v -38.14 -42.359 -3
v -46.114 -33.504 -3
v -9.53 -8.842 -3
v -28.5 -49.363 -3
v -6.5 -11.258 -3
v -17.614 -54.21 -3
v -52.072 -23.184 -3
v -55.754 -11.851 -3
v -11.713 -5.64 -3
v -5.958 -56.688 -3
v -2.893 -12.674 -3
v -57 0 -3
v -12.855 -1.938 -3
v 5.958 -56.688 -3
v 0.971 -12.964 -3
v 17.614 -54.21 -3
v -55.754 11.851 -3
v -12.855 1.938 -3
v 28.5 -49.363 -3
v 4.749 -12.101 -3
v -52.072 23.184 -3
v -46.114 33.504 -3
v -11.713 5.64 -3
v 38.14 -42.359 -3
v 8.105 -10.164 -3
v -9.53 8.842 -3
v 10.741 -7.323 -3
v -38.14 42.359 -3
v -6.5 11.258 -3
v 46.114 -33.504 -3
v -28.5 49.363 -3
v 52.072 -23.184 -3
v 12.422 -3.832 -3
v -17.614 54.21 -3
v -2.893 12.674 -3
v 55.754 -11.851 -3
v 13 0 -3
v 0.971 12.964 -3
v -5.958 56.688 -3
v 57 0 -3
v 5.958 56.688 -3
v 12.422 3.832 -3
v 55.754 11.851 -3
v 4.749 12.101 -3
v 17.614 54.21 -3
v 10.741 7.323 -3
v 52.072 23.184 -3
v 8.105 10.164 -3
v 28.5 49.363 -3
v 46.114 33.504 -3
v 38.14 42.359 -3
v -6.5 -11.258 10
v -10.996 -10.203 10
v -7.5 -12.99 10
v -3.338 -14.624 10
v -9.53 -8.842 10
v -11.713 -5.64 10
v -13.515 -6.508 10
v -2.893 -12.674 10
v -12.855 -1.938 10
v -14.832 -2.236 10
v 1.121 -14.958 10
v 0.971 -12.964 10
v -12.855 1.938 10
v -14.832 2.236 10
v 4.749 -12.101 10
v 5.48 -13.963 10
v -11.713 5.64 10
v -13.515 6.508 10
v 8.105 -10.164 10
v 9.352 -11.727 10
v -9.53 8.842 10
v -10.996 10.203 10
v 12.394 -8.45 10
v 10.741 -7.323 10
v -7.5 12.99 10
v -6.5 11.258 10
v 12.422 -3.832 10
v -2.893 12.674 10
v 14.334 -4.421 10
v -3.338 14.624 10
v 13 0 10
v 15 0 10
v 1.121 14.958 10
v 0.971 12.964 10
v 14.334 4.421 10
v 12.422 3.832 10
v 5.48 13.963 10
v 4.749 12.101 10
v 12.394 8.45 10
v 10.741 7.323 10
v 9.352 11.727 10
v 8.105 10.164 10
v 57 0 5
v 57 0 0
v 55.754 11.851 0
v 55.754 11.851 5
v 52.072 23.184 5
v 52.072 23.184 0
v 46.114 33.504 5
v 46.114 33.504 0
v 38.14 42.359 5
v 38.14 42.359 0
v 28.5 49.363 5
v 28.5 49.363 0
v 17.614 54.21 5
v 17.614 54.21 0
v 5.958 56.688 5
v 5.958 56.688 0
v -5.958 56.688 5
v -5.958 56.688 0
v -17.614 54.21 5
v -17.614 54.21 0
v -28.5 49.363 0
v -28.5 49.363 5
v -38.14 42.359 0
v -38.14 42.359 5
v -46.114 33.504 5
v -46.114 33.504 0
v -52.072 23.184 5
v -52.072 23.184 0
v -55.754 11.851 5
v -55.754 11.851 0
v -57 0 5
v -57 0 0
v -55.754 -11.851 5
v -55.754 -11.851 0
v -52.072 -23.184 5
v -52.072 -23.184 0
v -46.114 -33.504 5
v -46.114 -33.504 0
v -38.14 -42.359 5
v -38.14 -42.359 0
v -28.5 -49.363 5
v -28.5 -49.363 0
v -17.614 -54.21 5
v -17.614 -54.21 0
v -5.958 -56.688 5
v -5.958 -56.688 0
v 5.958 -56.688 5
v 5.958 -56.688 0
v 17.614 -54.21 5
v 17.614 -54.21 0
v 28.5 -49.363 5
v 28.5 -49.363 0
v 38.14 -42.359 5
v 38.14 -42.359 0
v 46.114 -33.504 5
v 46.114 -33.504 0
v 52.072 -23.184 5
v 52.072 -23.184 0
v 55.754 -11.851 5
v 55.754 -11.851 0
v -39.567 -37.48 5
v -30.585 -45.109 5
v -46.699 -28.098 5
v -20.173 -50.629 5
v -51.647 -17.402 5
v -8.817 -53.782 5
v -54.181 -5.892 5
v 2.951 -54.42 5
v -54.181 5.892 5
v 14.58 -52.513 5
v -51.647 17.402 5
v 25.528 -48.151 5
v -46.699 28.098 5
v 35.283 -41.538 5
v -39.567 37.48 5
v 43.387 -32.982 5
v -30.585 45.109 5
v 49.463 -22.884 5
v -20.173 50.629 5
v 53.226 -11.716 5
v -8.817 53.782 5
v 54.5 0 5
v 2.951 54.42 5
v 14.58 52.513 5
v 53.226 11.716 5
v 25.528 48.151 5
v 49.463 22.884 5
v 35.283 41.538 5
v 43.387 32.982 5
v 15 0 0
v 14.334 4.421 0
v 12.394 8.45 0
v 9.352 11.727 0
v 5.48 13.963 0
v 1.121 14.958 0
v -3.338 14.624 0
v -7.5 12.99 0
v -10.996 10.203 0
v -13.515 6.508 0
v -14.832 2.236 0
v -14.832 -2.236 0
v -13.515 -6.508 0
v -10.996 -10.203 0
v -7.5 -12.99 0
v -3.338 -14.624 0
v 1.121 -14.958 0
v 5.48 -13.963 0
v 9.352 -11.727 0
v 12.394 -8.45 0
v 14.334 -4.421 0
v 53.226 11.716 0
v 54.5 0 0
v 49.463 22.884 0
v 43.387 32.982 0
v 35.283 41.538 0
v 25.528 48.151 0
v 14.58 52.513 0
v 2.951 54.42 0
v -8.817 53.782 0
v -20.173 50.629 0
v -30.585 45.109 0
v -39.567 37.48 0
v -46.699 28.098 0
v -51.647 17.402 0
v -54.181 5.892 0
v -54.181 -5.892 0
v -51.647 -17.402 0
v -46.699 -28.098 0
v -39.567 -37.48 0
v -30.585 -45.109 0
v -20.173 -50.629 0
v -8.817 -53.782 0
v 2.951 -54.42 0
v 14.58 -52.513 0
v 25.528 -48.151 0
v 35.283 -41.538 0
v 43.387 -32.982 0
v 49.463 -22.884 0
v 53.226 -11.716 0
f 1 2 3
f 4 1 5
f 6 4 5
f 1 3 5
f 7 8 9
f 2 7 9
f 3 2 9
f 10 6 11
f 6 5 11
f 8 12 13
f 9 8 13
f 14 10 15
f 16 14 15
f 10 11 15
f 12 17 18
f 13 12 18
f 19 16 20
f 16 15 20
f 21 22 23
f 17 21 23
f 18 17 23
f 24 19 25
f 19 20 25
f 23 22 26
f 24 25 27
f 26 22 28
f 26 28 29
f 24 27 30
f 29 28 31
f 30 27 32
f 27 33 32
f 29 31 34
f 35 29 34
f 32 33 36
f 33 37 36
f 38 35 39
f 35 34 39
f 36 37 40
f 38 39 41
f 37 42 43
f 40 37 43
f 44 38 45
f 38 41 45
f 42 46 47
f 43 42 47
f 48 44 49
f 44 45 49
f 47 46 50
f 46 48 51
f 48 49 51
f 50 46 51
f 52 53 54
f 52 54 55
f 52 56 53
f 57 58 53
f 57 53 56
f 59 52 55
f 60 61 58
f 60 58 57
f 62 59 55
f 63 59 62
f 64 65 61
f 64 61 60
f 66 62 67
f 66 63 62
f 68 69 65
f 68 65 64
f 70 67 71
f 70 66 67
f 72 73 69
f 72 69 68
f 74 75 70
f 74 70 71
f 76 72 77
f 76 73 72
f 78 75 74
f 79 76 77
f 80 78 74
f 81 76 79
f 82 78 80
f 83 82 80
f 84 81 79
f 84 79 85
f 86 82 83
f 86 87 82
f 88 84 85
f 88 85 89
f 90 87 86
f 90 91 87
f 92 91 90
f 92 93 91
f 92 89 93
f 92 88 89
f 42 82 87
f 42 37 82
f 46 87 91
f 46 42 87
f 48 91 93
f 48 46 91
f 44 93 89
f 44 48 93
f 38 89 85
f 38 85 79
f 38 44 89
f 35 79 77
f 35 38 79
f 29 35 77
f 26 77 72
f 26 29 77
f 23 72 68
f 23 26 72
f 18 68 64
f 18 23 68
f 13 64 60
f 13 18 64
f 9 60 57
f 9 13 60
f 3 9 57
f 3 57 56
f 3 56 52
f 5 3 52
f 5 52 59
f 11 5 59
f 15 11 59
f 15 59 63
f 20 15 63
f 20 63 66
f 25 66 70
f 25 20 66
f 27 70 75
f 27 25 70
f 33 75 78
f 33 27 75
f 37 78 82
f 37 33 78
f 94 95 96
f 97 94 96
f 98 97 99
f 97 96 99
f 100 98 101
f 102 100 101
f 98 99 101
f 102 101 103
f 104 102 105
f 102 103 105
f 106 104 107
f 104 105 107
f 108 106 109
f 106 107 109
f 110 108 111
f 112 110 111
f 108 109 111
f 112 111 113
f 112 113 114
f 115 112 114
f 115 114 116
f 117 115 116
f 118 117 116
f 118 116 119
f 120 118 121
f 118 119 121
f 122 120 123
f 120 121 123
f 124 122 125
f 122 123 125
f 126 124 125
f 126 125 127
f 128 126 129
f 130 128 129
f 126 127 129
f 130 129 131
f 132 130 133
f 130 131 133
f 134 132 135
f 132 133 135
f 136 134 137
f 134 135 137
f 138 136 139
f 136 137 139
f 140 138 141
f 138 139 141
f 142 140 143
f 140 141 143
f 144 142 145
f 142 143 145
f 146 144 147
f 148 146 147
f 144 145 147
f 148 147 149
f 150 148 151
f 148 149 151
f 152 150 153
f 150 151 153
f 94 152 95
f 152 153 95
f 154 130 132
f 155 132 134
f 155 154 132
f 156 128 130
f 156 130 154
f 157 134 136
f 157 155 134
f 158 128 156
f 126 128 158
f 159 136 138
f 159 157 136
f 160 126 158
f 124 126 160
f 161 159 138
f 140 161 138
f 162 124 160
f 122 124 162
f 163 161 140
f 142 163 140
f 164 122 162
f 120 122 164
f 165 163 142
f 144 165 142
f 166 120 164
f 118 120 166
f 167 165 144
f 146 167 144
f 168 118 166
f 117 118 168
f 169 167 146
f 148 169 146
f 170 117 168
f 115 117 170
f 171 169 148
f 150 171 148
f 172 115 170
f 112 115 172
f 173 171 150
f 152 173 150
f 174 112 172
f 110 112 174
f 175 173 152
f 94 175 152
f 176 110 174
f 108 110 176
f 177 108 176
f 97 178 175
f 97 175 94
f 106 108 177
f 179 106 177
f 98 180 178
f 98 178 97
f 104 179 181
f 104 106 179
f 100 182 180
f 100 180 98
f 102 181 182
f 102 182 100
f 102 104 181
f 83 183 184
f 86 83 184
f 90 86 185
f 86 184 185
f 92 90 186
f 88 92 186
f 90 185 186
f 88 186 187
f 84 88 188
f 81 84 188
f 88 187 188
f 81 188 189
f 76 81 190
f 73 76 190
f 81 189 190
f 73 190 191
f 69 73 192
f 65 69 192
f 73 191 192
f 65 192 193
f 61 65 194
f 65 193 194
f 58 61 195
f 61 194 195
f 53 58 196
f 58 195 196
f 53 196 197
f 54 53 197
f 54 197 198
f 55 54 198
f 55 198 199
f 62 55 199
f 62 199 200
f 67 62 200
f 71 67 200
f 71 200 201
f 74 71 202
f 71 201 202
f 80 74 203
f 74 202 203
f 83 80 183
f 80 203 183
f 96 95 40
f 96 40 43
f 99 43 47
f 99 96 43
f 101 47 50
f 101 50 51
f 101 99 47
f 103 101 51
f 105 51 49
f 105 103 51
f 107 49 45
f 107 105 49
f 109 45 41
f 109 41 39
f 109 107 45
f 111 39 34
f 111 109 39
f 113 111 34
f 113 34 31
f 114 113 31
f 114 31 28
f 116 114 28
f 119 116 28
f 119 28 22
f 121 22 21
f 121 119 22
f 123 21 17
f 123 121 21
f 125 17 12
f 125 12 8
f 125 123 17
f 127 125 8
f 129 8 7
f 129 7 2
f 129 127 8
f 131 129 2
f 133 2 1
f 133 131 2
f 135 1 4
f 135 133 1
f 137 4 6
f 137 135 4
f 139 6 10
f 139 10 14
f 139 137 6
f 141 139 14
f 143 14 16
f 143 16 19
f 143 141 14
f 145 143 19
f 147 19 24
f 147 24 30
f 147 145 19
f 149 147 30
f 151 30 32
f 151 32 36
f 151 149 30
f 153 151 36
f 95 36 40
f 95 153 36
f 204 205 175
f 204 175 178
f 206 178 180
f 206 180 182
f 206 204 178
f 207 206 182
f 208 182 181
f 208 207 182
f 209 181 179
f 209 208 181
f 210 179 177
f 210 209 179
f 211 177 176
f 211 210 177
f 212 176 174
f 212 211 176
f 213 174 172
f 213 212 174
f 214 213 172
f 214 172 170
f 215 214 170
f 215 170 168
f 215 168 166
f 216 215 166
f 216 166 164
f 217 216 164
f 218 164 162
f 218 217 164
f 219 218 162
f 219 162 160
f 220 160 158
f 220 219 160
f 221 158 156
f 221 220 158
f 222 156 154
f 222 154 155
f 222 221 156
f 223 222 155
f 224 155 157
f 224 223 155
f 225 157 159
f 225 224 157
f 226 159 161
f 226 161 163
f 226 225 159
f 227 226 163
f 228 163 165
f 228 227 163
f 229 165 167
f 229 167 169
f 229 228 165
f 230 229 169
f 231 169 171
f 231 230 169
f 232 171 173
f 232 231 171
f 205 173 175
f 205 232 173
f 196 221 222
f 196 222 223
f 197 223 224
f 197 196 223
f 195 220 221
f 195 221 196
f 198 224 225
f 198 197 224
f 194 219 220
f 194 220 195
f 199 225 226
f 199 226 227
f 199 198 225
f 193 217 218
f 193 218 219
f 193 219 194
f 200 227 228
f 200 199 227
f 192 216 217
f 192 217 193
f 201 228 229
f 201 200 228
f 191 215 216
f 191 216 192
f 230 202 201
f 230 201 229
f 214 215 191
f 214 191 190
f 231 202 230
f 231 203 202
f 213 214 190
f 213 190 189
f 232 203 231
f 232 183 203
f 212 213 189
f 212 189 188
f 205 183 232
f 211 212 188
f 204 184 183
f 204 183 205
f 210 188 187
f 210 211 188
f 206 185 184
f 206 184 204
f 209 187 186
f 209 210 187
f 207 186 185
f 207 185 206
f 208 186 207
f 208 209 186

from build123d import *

# Parameters (mm, degrees)
F0_R     = 57
F0_R_2   = 54.5
F0_R_3   = 15
F0_R_4   = 13
F1_DEPTH = 3
F2_DEPTH = 5
F3_DEPTH = 10


with BuildPart() as f1:
    # F0 (on Top) → F1 (new body)
    with BuildSketch(Plane.XY):
        Circle(F0_R)
        Circle(F0_R_2, mode=Mode.SUBTRACT)
        Circle(F0_R_2)
        Circle(F0_R_3, mode=Mode.SUBTRACT)
        Circle(F0_R_3)
        Circle(F0_R_4, mode=Mode.SUBTRACT)
    extrude(amount=-F1_DEPTH)

    # F0 (on Top) → F2 (join)
    with BuildSketch(Plane.XY):
        Circle(F0_R)
        Circle(F0_R_2, mode=Mode.SUBTRACT)
    extrude(amount=F2_DEPTH)

    # F0 (on Top) → F3 (join)
    with BuildSketch(Plane.XY):
        Circle(F0_R_3)
        Circle(F0_R_4, mode=Mode.SUBTRACT)
    extrude(amount=F3_DEPTH)


solid = f1.part
